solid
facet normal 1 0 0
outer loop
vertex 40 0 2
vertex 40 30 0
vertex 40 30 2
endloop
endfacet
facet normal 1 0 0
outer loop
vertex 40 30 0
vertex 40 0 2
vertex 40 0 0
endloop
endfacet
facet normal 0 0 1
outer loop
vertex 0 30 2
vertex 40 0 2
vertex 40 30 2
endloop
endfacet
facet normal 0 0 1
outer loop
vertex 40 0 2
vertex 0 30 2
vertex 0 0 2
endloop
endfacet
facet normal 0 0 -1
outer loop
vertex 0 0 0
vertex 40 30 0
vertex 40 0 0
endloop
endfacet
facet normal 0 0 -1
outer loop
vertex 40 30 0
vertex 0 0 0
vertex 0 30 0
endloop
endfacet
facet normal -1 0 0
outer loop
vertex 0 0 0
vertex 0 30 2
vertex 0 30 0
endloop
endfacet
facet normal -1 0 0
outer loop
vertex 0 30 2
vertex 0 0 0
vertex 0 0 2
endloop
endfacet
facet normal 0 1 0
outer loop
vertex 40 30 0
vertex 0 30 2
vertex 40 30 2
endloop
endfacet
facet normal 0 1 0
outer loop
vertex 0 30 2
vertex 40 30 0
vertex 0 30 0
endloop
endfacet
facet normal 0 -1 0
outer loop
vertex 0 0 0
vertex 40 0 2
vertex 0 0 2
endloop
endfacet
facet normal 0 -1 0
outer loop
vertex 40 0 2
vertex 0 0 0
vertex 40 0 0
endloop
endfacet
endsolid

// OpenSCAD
  difference() {
      
    cube([ 40, 30, 2 ]);
      linear_extrude(1) {
    translate([ 0, -60, 1 ])
    import("/Users/darrylestes/Downloads/senior_driver/HomeworkSonarTechnicianInsignia.dxf");
      }
  
  }
